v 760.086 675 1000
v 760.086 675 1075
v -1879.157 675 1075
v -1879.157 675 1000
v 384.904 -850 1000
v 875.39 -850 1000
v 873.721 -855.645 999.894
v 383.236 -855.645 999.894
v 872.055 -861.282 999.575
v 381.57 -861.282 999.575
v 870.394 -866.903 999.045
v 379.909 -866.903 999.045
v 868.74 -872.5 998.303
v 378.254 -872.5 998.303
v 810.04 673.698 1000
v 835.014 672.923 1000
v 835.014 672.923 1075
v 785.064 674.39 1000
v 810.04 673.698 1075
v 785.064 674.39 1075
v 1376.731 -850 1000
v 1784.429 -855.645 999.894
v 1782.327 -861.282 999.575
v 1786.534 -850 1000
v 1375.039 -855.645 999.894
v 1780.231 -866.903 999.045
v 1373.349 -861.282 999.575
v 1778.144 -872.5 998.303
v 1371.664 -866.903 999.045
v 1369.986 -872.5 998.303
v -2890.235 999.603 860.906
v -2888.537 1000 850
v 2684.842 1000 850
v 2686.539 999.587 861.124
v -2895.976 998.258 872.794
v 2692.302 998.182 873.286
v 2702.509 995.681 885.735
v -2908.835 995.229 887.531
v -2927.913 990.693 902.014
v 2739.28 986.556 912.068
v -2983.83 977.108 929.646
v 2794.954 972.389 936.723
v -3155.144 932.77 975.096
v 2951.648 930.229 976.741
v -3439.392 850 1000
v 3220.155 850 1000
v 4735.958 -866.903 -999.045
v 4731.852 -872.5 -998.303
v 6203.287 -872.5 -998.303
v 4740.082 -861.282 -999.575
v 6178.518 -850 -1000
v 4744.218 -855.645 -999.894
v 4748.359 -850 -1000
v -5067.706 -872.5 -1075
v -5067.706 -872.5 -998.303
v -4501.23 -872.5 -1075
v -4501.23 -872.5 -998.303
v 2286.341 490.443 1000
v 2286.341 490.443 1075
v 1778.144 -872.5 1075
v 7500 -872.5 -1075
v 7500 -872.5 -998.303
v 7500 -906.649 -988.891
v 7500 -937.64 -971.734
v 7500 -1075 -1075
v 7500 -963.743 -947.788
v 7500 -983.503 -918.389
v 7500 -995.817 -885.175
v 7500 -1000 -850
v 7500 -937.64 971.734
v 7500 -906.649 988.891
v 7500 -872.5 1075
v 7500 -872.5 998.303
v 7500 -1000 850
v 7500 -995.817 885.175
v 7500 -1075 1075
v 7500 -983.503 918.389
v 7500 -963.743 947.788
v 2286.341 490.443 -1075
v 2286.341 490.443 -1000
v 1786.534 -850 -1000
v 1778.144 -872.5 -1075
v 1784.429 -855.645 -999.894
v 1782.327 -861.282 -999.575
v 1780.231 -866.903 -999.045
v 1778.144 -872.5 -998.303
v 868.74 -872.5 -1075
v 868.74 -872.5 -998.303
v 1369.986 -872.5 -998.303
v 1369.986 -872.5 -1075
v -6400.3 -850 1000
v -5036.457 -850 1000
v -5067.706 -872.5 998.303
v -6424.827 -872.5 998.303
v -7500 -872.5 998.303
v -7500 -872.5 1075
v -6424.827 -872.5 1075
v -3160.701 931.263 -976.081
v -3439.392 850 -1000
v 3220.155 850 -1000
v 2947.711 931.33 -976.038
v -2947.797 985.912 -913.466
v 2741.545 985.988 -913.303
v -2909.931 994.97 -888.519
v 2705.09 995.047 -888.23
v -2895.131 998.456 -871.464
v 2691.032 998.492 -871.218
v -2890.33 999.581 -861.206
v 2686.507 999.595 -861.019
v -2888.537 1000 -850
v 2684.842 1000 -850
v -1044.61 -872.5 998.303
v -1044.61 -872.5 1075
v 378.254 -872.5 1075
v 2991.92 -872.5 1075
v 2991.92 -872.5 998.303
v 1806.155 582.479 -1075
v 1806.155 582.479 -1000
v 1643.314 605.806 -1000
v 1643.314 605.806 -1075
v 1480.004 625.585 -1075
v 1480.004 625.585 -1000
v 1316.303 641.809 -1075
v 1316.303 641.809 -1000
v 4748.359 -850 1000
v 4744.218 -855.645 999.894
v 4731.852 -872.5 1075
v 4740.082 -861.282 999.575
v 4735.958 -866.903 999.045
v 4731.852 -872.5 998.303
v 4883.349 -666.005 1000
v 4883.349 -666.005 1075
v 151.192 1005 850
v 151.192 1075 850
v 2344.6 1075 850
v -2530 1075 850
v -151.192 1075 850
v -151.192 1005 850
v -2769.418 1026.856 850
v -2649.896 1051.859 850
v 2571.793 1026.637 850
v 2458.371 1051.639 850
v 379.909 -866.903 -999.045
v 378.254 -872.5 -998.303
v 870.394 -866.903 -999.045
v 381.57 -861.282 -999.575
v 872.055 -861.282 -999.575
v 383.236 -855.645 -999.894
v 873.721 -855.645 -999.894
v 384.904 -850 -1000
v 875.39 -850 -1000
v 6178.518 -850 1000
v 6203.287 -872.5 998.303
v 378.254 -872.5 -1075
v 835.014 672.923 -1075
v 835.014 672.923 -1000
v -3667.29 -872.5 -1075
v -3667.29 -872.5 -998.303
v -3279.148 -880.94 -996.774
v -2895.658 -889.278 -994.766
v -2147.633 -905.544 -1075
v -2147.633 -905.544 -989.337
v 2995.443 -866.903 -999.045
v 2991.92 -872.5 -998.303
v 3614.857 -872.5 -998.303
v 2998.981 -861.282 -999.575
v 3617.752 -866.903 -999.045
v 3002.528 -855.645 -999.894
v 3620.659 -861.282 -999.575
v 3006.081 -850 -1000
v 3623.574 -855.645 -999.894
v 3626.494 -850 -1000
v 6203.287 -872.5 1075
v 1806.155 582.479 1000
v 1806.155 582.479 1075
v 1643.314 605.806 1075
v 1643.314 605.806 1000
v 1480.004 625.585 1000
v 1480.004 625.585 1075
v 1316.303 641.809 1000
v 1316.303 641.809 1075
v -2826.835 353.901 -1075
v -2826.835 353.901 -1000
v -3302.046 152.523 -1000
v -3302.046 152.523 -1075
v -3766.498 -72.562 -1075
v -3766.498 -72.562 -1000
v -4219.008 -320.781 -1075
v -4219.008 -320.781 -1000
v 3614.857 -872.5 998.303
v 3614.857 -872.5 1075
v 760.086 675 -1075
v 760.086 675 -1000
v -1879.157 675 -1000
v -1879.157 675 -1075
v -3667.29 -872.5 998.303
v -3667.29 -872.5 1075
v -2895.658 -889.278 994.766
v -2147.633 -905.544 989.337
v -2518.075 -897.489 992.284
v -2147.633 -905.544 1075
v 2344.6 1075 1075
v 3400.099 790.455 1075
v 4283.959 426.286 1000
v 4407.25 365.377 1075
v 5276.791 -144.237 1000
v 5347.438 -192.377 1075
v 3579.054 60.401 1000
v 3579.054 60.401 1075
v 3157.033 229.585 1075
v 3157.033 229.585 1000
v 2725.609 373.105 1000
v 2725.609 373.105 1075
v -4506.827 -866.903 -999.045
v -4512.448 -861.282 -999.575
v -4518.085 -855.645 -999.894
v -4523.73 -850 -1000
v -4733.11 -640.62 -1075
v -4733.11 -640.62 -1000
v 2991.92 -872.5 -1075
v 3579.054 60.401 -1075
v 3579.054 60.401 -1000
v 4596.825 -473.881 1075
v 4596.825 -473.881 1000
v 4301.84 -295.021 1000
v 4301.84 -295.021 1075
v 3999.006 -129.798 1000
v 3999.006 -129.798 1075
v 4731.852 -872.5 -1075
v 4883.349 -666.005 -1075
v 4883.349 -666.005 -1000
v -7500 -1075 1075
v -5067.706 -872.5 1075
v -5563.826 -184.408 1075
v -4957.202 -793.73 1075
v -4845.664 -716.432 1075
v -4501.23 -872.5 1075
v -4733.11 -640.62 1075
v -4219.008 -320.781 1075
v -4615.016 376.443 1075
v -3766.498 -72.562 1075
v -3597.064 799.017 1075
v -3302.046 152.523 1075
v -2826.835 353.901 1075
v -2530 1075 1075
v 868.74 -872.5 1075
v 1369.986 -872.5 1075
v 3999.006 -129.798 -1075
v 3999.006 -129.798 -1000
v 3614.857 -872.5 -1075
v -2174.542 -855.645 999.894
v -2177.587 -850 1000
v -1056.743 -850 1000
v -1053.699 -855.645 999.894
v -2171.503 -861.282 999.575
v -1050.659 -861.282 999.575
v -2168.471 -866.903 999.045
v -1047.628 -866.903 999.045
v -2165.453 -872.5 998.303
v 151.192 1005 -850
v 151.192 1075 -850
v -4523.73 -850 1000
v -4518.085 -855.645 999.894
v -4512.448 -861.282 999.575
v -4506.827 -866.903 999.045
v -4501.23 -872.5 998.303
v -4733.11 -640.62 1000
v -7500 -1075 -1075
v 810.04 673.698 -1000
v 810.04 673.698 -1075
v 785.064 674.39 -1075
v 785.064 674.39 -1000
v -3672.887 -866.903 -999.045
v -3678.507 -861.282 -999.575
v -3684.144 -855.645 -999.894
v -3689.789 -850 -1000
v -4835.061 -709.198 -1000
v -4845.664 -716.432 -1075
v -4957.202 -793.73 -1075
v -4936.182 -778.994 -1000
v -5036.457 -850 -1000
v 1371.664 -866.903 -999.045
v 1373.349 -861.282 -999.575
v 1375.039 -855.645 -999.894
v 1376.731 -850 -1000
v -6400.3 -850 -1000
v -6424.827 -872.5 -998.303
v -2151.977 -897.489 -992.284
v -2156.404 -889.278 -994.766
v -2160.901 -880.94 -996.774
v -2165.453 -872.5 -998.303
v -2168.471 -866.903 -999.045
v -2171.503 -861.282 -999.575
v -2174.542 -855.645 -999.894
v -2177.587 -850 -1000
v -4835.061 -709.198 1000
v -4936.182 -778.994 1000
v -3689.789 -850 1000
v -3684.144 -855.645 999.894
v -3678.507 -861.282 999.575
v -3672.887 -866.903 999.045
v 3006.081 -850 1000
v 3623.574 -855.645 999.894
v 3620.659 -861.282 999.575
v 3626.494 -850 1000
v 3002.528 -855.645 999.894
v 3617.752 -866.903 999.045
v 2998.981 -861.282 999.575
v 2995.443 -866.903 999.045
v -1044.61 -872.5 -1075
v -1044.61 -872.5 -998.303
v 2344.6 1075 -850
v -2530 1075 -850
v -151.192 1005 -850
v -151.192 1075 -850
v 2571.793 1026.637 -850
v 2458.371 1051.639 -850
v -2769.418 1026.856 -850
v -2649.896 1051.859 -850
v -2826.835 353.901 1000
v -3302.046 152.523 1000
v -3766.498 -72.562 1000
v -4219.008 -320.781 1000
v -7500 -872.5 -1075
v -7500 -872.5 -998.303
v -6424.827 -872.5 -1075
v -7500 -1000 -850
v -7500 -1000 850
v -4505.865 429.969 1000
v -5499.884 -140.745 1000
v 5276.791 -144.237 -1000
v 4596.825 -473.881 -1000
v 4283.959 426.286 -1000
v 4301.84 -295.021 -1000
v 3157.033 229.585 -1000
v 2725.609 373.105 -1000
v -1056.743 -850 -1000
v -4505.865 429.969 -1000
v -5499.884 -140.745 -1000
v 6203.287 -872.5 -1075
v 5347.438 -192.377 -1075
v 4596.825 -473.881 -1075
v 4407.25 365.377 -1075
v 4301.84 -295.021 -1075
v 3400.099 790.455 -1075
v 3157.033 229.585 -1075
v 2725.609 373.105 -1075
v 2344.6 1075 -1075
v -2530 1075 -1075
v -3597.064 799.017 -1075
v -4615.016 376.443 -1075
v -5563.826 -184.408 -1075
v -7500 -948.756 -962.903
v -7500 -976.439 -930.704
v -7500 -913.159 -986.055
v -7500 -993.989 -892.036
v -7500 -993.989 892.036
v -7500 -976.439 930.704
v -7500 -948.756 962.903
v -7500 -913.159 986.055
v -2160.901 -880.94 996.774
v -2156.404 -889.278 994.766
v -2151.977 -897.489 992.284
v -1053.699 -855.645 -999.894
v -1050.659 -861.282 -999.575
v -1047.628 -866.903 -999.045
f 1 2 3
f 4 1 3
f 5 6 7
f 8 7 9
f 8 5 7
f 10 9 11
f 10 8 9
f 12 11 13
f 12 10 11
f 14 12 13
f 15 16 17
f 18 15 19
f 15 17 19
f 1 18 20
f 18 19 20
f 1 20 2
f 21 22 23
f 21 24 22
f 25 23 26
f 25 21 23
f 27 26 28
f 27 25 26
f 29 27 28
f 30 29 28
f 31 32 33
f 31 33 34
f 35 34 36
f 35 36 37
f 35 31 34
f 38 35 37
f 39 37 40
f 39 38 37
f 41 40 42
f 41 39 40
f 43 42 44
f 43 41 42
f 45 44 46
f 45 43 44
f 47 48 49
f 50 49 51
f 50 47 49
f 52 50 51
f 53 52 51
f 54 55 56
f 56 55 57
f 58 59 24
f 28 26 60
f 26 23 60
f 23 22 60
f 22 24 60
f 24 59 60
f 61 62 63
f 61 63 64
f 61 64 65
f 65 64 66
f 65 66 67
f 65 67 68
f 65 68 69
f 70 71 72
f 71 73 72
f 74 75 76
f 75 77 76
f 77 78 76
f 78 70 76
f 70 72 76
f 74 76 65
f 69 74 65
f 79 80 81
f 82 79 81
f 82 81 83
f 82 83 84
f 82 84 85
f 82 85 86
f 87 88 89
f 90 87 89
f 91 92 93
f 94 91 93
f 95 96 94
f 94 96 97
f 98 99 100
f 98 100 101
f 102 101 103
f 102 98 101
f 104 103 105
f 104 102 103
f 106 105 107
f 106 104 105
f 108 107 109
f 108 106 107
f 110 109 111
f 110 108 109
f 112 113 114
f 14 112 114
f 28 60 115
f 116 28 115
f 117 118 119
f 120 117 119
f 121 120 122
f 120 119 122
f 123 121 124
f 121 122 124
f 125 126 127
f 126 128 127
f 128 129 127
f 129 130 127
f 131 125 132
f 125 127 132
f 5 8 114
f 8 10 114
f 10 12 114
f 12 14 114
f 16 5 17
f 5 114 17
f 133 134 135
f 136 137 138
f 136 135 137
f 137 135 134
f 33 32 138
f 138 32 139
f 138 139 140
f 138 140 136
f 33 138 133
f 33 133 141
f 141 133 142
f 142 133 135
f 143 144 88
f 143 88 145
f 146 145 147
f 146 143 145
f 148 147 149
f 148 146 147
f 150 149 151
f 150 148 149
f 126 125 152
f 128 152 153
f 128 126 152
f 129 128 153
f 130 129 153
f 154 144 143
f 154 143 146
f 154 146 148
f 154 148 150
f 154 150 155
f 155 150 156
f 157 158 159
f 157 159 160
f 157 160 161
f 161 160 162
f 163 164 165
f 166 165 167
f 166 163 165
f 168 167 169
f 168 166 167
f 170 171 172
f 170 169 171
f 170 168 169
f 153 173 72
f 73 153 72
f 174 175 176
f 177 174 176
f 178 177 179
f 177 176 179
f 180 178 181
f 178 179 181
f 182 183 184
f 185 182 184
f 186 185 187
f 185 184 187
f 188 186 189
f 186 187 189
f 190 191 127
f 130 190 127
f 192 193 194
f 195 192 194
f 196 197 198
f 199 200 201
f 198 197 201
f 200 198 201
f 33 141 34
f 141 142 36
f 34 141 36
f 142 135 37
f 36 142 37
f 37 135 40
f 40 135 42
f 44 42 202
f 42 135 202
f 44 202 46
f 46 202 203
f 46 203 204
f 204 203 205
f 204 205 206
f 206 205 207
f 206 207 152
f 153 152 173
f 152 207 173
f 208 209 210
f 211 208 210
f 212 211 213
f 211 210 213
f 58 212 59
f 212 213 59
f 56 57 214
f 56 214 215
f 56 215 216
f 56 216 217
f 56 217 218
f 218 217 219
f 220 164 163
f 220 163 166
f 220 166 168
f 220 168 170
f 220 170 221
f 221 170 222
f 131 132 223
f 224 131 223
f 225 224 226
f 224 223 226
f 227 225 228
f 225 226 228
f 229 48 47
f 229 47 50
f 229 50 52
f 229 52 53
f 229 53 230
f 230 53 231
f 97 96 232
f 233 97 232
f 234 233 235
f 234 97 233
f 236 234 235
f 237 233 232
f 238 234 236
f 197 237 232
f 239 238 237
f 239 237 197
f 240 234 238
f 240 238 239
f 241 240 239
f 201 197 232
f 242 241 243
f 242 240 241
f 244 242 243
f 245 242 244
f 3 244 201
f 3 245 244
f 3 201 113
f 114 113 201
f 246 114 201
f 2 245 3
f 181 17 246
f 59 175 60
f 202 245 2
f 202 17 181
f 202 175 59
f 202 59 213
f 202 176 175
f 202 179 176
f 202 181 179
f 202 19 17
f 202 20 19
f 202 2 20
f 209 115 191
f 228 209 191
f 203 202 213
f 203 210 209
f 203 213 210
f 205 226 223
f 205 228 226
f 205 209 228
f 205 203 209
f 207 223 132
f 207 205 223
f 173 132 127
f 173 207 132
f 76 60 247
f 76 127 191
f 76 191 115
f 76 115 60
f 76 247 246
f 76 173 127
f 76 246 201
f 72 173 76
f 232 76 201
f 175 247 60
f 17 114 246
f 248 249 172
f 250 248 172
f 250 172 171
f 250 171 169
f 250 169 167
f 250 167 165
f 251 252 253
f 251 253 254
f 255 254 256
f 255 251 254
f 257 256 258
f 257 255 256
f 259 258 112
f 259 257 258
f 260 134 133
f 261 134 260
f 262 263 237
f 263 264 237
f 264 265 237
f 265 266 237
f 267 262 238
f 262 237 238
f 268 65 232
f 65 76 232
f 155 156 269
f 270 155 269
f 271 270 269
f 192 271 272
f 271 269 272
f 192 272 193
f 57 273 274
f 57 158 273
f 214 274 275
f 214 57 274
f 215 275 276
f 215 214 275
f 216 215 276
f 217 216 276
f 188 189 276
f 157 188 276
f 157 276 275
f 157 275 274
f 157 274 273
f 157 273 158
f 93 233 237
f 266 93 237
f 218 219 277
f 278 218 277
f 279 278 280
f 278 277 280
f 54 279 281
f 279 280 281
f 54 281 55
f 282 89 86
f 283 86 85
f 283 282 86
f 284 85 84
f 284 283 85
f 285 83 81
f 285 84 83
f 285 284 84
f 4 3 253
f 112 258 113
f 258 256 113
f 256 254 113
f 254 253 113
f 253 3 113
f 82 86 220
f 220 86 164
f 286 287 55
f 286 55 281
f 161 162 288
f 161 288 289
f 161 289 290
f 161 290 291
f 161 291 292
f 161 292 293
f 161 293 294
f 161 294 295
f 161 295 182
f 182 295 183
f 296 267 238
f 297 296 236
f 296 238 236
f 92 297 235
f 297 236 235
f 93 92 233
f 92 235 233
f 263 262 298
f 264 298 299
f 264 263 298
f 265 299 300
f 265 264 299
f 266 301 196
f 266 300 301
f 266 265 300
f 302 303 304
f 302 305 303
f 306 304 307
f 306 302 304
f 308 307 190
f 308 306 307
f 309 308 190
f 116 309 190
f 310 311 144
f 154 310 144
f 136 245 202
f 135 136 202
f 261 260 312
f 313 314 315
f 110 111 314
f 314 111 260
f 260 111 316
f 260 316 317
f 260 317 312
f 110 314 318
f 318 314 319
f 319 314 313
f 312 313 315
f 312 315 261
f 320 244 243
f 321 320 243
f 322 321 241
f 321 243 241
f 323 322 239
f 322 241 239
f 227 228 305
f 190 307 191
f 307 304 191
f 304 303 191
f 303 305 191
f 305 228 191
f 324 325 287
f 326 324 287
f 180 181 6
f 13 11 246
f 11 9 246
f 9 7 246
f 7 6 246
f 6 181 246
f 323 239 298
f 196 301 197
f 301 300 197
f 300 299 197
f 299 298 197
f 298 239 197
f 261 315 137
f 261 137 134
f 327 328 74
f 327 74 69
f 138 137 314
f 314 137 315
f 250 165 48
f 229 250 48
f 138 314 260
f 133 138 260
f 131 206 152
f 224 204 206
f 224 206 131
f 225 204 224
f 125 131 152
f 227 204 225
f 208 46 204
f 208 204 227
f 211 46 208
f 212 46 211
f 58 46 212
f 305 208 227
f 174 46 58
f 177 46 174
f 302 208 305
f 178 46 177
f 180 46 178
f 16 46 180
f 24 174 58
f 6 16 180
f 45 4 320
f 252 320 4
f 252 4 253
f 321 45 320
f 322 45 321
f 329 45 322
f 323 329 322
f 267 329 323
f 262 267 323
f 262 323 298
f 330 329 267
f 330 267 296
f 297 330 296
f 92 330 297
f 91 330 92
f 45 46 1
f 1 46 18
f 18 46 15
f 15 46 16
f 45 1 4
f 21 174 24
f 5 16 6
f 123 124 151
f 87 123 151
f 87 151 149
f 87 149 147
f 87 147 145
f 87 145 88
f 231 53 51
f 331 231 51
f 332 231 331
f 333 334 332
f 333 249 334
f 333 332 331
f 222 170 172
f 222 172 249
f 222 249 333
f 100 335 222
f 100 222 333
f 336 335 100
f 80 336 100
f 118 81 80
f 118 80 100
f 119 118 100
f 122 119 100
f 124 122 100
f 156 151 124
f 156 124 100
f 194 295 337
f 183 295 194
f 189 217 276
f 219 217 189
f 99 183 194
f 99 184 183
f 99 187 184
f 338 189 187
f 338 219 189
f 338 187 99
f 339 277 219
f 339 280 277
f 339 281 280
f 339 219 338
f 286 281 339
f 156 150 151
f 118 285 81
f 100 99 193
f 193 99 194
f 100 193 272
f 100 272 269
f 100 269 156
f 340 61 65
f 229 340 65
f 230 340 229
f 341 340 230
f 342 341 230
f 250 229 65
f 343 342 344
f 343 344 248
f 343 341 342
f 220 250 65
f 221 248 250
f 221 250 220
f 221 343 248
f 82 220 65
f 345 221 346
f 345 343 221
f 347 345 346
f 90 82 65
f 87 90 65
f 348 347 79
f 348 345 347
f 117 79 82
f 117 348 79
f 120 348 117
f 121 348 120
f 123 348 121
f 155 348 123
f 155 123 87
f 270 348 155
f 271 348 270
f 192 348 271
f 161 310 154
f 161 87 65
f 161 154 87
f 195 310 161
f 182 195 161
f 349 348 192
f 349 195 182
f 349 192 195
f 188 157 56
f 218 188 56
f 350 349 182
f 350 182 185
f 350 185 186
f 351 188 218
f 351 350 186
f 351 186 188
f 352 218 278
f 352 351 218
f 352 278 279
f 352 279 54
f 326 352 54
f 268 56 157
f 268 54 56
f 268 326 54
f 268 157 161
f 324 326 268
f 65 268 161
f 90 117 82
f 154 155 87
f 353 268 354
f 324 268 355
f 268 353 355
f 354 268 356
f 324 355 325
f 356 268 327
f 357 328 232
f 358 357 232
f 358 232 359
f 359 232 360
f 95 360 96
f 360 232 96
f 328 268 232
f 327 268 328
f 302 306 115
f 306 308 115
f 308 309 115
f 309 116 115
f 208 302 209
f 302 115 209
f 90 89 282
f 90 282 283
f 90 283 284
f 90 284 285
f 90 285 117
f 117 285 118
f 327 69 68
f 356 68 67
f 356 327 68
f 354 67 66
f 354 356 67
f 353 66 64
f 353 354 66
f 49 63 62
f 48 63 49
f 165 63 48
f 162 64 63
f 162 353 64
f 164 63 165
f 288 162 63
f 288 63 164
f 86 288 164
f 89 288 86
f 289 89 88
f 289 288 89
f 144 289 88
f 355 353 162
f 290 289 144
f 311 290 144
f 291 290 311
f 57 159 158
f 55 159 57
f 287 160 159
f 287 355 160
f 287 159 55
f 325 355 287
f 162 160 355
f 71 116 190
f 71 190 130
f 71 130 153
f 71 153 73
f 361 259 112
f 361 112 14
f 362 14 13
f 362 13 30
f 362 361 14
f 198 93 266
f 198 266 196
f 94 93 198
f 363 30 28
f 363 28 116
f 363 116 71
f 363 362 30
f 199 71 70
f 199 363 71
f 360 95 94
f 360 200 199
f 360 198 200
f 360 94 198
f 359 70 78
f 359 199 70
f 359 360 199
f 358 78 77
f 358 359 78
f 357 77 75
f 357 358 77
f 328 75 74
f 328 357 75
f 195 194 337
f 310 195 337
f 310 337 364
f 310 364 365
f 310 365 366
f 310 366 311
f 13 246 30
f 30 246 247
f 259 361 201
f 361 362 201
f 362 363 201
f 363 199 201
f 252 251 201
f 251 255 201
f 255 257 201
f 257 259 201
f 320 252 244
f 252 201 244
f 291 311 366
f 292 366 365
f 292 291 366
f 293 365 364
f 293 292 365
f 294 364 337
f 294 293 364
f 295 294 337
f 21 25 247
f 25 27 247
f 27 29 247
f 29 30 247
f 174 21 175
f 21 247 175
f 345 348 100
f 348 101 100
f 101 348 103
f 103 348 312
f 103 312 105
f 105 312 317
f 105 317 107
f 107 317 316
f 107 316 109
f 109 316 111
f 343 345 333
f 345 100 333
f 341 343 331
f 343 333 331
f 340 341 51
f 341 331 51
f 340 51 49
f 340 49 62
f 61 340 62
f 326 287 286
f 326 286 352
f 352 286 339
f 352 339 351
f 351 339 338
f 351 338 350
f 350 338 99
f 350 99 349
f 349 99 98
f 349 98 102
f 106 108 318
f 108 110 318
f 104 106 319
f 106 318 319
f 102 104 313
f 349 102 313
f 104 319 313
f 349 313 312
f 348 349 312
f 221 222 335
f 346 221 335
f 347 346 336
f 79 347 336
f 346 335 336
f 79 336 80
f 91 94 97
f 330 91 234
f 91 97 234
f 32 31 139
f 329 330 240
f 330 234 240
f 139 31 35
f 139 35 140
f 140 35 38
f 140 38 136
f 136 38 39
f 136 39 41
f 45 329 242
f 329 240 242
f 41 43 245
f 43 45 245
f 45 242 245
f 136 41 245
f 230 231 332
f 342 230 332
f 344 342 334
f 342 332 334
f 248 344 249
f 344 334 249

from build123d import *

# Parameters (mm, degrees)
BOSS_EXTRUDE1_DEPTH     = 1075
CUT_EXTRUDE1_DEPTH      = 7653.532305167
CUT_EXTRUDE1_DEPTH_BACK = 7653.532305167
SKETCH5_W               = 302.383880832
SKETCH5_H               = 2150
BOSS_EXTRUDE2_DEPTH     = 70


with BuildPart() as part:
    # Sketch1 → Boss-Extrude1 (new, symmetric)
    with BuildSketch(Plane.XY):
        with BuildLine():
            Line((-2530, 1075.000317032), (2344.599897209, 1075.000317032))
            ThreePointArc((2344.599897209, 1075.000317032), (4407.249810354, 365.377337752), (6203.287092397, -872.499682968))
            Line((6203.287092397, -872.499682968), (7500, -872.499682968))
            Line((7500, -872.499682968), (7499.99977297, -1075.000317032))
            Line((7499.99977297, -1075.000317032), (-7500, -1074.999772413))
            Line((-7500, -1074.999772413), (-7500, -872.499682968))
            Line((-7500, -872.499682968), (-6424.826662056, -872.499682968))
            ThreePointArc((-6424.826662056, -872.499682968), (-4615.015680989, 376.442769607), (-2530, 1075.000317032))
        make_face()
        with BuildLine():
            ThreePointArc((1806.155094546, 582.478715569), (1561.713088192, 616.139546066), (1316.303182053, 641.809060073))
            Line((1316.303182053, 641.809060073), (868.739855923, -872.499682968))
            Line((868.739855923, -872.499682968), (1369.985931107, -872.499682968))
            Line((1369.985931107, -872.499682968), (1806.155094546, 582.478715569))
        make_face(mode=Mode.SUBTRACT)
        with BuildLine():
            ThreePointArc((835.013703981, 672.923190827), (797.55231686, 674.054573087), (760.085783537, 675.000317032))
            Line((760.085783537, 675.000317032), (-1879.1568192, 675.000317032))
            Line((-1879.1568192, 675.000317032), (-1044.609704387, -872.499682968))
            Line((-1044.609704387, -872.499682968), (378.254403837, -872.499682968))
            Line((378.254403837, -872.499682968), (835.013703981, 672.923190827))
        make_face(mode=Mode.SUBTRACT)
        with BuildLine():
            ThreePointArc((-4733.10962669, -640.620236119), (-4901.561226224, -754.89575708), (-5067.706201147, -872.499682968))
            Line((-5067.706201147, -872.499682968), (-4501.230179842, -872.499682968))
            Line((-4501.230179842, -872.499682968), (-4733.10962669, -640.620236119))
        make_face(mode=Mode.SUBTRACT)
        with BuildLine():
            ThreePointArc((3579.05419078, 60.401493406), (2942.399920145, 304.587131085), (2286.341329526, 490.443020531))
            Line((2286.341329526, 490.443020531), (1778.144230839, -872.499682968))
            Line((1778.144230839, -872.499682968), (2991.920398852, -872.499682968))
            Line((2991.920398852, -872.499682968), (3579.05419078, 60.401493406))
        make_face(mode=Mode.SUBTRACT)
        with BuildLine():
            ThreePointArc((4883.348550373, -666.005495378), (4450.352550901, -382.76879992), (3999.005567619, -129.797532984))
            Line((3999.005567619, -129.797532984), (3614.856579636, -872.499682968))
            Line((3614.856579636, -872.499682968), (4731.852121641, -872.499682968))
            Line((4731.852121641, -872.499682968), (4883.348550373, -666.005495378))
        make_face(mode=Mode.SUBTRACT)
        with BuildLine():
            ThreePointArc((-2826.835366329, 353.901285175), (-3535.691308305, 42.90933788), (-4219.008249765, -320.781045922))
            Line((-4219.008249765, -320.781045922), (-3667.289612719, -872.499682968))
            Line((-3667.289612719, -872.499682968), (-2147.632767673, -905.543511608))
            Line((-2147.632767673, -905.543511608), (-2826.835366329, 353.901285175))
        make_face(mode=Mode.SUBTRACT)
    extrude(amount=BOSS_EXTRUDE1_DEPTH, both=True)

    # Sketch2 → Cut-Extrude1 (cut, two sides: drawn at the far end of the back side and taken through both)
    with BuildSketch(Plane(origin=(0, 0, 0), x_dir=(0, 0, -1), z_dir=(1, 0, 0)).offset(-CUT_EXTRUDE1_DEPTH_BACK)):
        with BuildLine():
            ThreePointArc((-1000, -850), (-999.575135199, -861.281796405), (-998.302947598, -872.499682968))
            ThreePointArc((-998.302947598, -872.499682968), (-947.788157654, -963.743027138), (-850, -1000))
            Line((-850, -1000), (850, -1000))
            ThreePointArc((850, -1000), (947.788157654, -963.743027138), (998.302947598, -872.499682968))
            ThreePointArc((998.302947598, -872.499682968), (999.575135199, -861.281796405), (1000, -850))
            Line((1000, -850), (1000, 850))
            ThreePointArc((1000, 850), (956.066017178, 956.066017178), (850, 1000))
            Line((850, 1000), (850, 1075.000317032))
            Line((850, 1075.000317032), (-850, 1075.000317032))
            Line((-850, 1075.000317032), (-850, 1000))
            ThreePointArc((-850, 1000), (-956.066017178, 956.066017178), (-1000, 850))
            Line((-1000, 850), (-1000, -850))
        make_face()
    extrude(amount=CUT_EXTRUDE1_DEPTH + CUT_EXTRUDE1_DEPTH_BACK, mode=Mode.SUBTRACT)

    # Sketch5 → Boss-Extrude2 (add)
    with BuildSketch(Plane(origin=(0, 1075, 0), x_dir=(1, 0, 0), z_dir=(0, 1, 0))):
        Rectangle(SKETCH5_W, SKETCH5_H)
    extrude(amount=-BOSS_EXTRUDE2_DEPTH)


solid = part.part
